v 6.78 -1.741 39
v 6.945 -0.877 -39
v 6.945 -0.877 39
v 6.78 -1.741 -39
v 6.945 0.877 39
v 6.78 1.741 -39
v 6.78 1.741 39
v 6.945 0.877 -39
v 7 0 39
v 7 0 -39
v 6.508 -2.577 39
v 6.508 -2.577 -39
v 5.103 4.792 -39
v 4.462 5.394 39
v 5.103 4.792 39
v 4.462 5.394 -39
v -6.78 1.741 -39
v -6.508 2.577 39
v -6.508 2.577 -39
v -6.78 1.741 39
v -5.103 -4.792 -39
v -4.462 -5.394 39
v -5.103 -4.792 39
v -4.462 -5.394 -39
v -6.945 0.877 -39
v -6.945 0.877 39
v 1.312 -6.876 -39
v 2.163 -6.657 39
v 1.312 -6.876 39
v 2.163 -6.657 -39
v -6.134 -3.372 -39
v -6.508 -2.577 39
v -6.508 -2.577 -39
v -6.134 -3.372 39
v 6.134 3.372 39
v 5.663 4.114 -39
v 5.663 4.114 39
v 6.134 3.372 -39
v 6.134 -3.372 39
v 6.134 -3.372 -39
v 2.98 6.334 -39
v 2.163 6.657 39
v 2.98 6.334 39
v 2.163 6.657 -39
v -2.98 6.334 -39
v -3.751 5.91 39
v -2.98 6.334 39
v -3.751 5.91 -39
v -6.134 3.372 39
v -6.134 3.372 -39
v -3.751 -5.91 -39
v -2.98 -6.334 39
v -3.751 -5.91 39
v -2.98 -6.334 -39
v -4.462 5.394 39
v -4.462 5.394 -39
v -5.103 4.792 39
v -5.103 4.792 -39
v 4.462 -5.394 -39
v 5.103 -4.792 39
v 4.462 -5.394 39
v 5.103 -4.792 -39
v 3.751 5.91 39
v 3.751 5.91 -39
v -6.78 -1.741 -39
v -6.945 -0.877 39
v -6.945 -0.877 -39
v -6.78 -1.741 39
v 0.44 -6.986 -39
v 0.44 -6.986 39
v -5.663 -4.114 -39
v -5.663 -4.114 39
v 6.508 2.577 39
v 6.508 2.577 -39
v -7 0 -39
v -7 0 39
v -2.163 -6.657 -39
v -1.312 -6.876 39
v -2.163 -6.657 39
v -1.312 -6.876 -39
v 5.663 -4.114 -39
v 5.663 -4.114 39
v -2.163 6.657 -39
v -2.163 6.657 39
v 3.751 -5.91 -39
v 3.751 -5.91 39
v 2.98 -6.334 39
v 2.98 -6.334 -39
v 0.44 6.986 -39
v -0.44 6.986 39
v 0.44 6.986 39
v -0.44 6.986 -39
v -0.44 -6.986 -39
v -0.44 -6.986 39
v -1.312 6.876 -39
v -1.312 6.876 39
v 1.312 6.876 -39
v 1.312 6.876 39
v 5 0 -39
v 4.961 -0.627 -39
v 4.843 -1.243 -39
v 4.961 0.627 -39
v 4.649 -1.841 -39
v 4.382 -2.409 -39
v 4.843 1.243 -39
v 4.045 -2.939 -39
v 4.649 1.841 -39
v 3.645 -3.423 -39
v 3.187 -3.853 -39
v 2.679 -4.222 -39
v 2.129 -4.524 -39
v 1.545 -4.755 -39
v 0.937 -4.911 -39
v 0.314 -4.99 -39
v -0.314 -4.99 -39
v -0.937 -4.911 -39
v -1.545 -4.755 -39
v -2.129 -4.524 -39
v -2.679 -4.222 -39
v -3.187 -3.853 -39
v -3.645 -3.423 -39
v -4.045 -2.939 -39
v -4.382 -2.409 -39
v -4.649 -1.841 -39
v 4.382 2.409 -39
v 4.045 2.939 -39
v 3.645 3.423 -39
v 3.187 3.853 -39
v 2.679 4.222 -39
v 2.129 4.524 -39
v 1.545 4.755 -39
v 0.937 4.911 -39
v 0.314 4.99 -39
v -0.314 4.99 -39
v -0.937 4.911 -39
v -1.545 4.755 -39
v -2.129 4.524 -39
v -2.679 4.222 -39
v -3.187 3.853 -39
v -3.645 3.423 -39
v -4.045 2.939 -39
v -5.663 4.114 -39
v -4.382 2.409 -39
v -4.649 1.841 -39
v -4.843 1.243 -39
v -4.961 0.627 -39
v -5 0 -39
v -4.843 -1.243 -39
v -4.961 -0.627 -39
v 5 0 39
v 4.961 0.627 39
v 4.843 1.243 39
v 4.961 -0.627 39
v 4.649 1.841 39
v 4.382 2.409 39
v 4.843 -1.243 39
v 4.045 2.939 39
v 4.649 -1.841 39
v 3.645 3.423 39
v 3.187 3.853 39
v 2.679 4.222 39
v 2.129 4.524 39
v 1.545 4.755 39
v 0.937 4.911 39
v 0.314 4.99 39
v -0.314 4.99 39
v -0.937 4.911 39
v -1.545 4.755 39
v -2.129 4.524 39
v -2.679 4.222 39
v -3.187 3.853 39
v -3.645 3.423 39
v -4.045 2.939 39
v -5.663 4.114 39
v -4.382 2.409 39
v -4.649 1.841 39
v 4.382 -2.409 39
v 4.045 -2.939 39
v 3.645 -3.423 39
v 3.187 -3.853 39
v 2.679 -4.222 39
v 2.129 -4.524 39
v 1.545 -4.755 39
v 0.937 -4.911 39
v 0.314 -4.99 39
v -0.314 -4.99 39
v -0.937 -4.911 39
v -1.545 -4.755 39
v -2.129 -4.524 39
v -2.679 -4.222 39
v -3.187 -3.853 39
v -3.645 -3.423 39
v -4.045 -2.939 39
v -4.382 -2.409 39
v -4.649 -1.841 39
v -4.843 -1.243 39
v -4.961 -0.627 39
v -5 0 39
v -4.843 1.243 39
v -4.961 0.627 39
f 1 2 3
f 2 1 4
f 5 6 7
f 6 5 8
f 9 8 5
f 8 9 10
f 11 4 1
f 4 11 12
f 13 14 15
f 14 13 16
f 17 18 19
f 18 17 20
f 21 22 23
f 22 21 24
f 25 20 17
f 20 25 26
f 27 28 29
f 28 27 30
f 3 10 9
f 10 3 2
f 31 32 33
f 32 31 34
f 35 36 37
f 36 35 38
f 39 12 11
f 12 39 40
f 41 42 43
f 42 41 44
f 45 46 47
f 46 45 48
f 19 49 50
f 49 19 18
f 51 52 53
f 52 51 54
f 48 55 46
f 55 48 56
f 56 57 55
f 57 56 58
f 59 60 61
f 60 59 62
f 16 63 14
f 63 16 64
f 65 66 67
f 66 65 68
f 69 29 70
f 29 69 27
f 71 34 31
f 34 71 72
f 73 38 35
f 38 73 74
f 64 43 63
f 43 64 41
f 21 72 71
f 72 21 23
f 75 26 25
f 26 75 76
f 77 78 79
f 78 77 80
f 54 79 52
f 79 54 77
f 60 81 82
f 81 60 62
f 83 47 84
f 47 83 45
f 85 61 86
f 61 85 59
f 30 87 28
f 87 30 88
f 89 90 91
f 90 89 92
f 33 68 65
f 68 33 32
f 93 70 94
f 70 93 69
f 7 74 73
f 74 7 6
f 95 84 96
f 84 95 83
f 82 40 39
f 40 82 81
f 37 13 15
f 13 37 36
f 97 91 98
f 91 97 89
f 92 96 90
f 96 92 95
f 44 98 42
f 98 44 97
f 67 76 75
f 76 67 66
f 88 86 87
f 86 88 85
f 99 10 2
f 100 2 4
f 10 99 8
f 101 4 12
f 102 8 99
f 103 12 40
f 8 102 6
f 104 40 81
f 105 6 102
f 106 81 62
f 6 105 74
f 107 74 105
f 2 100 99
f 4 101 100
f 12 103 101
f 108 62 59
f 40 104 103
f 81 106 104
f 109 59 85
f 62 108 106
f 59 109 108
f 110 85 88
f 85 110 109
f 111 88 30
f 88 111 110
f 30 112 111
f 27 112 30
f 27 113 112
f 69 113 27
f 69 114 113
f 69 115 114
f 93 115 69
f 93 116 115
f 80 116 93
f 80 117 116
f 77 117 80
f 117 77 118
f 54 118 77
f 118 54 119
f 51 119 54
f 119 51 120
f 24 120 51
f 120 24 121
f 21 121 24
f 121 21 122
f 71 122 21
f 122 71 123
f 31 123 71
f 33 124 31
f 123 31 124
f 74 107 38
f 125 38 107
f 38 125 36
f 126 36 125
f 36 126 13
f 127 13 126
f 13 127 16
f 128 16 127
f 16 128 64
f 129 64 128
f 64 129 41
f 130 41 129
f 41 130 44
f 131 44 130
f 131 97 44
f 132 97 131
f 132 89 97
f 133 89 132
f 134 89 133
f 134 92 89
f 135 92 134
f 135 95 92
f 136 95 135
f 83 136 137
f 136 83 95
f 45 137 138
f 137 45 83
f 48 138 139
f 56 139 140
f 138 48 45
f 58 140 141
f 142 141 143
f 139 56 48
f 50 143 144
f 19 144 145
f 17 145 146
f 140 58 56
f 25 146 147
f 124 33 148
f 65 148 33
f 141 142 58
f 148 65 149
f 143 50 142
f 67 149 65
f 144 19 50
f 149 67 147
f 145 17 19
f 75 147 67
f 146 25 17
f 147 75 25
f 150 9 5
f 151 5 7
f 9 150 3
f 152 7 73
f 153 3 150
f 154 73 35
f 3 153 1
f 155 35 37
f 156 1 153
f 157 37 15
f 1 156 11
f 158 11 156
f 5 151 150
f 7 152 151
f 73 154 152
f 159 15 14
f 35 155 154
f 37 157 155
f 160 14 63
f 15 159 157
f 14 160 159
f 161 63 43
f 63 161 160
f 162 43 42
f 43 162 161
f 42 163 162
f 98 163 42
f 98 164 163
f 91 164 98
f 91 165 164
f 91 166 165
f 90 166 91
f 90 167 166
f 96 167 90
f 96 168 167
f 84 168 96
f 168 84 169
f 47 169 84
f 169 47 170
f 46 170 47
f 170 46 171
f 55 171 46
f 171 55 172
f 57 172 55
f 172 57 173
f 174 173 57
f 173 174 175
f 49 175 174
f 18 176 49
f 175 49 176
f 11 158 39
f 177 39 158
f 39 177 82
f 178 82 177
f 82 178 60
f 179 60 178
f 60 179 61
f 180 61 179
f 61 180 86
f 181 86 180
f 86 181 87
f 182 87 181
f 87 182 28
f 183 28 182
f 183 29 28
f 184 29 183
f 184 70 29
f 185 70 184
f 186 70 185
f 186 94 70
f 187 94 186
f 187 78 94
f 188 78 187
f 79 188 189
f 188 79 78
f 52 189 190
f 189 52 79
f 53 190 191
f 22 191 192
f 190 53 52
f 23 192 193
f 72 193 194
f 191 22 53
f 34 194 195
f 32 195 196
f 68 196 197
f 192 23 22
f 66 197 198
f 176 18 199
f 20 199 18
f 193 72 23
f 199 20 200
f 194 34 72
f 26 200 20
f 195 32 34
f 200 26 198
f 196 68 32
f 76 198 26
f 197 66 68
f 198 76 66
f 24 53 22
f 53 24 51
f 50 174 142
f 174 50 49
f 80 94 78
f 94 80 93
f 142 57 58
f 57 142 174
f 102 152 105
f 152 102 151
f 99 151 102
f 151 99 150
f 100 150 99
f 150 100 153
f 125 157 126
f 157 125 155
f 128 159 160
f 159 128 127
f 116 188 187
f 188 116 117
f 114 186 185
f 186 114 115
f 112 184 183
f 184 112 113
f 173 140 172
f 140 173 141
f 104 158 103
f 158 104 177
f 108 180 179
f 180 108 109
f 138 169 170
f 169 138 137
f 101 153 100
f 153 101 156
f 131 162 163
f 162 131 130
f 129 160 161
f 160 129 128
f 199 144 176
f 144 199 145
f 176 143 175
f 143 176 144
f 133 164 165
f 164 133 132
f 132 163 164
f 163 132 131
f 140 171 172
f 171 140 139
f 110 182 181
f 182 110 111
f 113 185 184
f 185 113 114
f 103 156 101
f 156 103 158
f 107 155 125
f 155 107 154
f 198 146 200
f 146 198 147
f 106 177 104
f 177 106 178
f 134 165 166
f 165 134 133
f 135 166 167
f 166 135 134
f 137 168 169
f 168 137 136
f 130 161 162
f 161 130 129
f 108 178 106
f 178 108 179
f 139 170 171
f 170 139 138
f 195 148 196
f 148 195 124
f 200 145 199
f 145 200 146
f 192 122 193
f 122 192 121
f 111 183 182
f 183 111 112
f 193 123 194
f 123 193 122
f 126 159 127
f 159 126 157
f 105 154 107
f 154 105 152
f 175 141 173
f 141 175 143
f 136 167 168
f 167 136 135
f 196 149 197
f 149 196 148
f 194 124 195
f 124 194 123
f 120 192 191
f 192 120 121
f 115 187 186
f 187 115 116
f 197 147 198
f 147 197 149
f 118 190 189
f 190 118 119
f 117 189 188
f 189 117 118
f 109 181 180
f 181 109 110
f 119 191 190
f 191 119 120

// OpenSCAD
$fn = 50;


difference() {
	union() {
		translate(v = [0, 0, -39.0000000000]) {
			cylinder(h = 78, r = 7.0000000000);
		}
	}
	union() {
		translate(v = [0, 0, -100.0000000000]) {
			cylinder(h = 200, r = 5.0000000000);
		}
	}
}
